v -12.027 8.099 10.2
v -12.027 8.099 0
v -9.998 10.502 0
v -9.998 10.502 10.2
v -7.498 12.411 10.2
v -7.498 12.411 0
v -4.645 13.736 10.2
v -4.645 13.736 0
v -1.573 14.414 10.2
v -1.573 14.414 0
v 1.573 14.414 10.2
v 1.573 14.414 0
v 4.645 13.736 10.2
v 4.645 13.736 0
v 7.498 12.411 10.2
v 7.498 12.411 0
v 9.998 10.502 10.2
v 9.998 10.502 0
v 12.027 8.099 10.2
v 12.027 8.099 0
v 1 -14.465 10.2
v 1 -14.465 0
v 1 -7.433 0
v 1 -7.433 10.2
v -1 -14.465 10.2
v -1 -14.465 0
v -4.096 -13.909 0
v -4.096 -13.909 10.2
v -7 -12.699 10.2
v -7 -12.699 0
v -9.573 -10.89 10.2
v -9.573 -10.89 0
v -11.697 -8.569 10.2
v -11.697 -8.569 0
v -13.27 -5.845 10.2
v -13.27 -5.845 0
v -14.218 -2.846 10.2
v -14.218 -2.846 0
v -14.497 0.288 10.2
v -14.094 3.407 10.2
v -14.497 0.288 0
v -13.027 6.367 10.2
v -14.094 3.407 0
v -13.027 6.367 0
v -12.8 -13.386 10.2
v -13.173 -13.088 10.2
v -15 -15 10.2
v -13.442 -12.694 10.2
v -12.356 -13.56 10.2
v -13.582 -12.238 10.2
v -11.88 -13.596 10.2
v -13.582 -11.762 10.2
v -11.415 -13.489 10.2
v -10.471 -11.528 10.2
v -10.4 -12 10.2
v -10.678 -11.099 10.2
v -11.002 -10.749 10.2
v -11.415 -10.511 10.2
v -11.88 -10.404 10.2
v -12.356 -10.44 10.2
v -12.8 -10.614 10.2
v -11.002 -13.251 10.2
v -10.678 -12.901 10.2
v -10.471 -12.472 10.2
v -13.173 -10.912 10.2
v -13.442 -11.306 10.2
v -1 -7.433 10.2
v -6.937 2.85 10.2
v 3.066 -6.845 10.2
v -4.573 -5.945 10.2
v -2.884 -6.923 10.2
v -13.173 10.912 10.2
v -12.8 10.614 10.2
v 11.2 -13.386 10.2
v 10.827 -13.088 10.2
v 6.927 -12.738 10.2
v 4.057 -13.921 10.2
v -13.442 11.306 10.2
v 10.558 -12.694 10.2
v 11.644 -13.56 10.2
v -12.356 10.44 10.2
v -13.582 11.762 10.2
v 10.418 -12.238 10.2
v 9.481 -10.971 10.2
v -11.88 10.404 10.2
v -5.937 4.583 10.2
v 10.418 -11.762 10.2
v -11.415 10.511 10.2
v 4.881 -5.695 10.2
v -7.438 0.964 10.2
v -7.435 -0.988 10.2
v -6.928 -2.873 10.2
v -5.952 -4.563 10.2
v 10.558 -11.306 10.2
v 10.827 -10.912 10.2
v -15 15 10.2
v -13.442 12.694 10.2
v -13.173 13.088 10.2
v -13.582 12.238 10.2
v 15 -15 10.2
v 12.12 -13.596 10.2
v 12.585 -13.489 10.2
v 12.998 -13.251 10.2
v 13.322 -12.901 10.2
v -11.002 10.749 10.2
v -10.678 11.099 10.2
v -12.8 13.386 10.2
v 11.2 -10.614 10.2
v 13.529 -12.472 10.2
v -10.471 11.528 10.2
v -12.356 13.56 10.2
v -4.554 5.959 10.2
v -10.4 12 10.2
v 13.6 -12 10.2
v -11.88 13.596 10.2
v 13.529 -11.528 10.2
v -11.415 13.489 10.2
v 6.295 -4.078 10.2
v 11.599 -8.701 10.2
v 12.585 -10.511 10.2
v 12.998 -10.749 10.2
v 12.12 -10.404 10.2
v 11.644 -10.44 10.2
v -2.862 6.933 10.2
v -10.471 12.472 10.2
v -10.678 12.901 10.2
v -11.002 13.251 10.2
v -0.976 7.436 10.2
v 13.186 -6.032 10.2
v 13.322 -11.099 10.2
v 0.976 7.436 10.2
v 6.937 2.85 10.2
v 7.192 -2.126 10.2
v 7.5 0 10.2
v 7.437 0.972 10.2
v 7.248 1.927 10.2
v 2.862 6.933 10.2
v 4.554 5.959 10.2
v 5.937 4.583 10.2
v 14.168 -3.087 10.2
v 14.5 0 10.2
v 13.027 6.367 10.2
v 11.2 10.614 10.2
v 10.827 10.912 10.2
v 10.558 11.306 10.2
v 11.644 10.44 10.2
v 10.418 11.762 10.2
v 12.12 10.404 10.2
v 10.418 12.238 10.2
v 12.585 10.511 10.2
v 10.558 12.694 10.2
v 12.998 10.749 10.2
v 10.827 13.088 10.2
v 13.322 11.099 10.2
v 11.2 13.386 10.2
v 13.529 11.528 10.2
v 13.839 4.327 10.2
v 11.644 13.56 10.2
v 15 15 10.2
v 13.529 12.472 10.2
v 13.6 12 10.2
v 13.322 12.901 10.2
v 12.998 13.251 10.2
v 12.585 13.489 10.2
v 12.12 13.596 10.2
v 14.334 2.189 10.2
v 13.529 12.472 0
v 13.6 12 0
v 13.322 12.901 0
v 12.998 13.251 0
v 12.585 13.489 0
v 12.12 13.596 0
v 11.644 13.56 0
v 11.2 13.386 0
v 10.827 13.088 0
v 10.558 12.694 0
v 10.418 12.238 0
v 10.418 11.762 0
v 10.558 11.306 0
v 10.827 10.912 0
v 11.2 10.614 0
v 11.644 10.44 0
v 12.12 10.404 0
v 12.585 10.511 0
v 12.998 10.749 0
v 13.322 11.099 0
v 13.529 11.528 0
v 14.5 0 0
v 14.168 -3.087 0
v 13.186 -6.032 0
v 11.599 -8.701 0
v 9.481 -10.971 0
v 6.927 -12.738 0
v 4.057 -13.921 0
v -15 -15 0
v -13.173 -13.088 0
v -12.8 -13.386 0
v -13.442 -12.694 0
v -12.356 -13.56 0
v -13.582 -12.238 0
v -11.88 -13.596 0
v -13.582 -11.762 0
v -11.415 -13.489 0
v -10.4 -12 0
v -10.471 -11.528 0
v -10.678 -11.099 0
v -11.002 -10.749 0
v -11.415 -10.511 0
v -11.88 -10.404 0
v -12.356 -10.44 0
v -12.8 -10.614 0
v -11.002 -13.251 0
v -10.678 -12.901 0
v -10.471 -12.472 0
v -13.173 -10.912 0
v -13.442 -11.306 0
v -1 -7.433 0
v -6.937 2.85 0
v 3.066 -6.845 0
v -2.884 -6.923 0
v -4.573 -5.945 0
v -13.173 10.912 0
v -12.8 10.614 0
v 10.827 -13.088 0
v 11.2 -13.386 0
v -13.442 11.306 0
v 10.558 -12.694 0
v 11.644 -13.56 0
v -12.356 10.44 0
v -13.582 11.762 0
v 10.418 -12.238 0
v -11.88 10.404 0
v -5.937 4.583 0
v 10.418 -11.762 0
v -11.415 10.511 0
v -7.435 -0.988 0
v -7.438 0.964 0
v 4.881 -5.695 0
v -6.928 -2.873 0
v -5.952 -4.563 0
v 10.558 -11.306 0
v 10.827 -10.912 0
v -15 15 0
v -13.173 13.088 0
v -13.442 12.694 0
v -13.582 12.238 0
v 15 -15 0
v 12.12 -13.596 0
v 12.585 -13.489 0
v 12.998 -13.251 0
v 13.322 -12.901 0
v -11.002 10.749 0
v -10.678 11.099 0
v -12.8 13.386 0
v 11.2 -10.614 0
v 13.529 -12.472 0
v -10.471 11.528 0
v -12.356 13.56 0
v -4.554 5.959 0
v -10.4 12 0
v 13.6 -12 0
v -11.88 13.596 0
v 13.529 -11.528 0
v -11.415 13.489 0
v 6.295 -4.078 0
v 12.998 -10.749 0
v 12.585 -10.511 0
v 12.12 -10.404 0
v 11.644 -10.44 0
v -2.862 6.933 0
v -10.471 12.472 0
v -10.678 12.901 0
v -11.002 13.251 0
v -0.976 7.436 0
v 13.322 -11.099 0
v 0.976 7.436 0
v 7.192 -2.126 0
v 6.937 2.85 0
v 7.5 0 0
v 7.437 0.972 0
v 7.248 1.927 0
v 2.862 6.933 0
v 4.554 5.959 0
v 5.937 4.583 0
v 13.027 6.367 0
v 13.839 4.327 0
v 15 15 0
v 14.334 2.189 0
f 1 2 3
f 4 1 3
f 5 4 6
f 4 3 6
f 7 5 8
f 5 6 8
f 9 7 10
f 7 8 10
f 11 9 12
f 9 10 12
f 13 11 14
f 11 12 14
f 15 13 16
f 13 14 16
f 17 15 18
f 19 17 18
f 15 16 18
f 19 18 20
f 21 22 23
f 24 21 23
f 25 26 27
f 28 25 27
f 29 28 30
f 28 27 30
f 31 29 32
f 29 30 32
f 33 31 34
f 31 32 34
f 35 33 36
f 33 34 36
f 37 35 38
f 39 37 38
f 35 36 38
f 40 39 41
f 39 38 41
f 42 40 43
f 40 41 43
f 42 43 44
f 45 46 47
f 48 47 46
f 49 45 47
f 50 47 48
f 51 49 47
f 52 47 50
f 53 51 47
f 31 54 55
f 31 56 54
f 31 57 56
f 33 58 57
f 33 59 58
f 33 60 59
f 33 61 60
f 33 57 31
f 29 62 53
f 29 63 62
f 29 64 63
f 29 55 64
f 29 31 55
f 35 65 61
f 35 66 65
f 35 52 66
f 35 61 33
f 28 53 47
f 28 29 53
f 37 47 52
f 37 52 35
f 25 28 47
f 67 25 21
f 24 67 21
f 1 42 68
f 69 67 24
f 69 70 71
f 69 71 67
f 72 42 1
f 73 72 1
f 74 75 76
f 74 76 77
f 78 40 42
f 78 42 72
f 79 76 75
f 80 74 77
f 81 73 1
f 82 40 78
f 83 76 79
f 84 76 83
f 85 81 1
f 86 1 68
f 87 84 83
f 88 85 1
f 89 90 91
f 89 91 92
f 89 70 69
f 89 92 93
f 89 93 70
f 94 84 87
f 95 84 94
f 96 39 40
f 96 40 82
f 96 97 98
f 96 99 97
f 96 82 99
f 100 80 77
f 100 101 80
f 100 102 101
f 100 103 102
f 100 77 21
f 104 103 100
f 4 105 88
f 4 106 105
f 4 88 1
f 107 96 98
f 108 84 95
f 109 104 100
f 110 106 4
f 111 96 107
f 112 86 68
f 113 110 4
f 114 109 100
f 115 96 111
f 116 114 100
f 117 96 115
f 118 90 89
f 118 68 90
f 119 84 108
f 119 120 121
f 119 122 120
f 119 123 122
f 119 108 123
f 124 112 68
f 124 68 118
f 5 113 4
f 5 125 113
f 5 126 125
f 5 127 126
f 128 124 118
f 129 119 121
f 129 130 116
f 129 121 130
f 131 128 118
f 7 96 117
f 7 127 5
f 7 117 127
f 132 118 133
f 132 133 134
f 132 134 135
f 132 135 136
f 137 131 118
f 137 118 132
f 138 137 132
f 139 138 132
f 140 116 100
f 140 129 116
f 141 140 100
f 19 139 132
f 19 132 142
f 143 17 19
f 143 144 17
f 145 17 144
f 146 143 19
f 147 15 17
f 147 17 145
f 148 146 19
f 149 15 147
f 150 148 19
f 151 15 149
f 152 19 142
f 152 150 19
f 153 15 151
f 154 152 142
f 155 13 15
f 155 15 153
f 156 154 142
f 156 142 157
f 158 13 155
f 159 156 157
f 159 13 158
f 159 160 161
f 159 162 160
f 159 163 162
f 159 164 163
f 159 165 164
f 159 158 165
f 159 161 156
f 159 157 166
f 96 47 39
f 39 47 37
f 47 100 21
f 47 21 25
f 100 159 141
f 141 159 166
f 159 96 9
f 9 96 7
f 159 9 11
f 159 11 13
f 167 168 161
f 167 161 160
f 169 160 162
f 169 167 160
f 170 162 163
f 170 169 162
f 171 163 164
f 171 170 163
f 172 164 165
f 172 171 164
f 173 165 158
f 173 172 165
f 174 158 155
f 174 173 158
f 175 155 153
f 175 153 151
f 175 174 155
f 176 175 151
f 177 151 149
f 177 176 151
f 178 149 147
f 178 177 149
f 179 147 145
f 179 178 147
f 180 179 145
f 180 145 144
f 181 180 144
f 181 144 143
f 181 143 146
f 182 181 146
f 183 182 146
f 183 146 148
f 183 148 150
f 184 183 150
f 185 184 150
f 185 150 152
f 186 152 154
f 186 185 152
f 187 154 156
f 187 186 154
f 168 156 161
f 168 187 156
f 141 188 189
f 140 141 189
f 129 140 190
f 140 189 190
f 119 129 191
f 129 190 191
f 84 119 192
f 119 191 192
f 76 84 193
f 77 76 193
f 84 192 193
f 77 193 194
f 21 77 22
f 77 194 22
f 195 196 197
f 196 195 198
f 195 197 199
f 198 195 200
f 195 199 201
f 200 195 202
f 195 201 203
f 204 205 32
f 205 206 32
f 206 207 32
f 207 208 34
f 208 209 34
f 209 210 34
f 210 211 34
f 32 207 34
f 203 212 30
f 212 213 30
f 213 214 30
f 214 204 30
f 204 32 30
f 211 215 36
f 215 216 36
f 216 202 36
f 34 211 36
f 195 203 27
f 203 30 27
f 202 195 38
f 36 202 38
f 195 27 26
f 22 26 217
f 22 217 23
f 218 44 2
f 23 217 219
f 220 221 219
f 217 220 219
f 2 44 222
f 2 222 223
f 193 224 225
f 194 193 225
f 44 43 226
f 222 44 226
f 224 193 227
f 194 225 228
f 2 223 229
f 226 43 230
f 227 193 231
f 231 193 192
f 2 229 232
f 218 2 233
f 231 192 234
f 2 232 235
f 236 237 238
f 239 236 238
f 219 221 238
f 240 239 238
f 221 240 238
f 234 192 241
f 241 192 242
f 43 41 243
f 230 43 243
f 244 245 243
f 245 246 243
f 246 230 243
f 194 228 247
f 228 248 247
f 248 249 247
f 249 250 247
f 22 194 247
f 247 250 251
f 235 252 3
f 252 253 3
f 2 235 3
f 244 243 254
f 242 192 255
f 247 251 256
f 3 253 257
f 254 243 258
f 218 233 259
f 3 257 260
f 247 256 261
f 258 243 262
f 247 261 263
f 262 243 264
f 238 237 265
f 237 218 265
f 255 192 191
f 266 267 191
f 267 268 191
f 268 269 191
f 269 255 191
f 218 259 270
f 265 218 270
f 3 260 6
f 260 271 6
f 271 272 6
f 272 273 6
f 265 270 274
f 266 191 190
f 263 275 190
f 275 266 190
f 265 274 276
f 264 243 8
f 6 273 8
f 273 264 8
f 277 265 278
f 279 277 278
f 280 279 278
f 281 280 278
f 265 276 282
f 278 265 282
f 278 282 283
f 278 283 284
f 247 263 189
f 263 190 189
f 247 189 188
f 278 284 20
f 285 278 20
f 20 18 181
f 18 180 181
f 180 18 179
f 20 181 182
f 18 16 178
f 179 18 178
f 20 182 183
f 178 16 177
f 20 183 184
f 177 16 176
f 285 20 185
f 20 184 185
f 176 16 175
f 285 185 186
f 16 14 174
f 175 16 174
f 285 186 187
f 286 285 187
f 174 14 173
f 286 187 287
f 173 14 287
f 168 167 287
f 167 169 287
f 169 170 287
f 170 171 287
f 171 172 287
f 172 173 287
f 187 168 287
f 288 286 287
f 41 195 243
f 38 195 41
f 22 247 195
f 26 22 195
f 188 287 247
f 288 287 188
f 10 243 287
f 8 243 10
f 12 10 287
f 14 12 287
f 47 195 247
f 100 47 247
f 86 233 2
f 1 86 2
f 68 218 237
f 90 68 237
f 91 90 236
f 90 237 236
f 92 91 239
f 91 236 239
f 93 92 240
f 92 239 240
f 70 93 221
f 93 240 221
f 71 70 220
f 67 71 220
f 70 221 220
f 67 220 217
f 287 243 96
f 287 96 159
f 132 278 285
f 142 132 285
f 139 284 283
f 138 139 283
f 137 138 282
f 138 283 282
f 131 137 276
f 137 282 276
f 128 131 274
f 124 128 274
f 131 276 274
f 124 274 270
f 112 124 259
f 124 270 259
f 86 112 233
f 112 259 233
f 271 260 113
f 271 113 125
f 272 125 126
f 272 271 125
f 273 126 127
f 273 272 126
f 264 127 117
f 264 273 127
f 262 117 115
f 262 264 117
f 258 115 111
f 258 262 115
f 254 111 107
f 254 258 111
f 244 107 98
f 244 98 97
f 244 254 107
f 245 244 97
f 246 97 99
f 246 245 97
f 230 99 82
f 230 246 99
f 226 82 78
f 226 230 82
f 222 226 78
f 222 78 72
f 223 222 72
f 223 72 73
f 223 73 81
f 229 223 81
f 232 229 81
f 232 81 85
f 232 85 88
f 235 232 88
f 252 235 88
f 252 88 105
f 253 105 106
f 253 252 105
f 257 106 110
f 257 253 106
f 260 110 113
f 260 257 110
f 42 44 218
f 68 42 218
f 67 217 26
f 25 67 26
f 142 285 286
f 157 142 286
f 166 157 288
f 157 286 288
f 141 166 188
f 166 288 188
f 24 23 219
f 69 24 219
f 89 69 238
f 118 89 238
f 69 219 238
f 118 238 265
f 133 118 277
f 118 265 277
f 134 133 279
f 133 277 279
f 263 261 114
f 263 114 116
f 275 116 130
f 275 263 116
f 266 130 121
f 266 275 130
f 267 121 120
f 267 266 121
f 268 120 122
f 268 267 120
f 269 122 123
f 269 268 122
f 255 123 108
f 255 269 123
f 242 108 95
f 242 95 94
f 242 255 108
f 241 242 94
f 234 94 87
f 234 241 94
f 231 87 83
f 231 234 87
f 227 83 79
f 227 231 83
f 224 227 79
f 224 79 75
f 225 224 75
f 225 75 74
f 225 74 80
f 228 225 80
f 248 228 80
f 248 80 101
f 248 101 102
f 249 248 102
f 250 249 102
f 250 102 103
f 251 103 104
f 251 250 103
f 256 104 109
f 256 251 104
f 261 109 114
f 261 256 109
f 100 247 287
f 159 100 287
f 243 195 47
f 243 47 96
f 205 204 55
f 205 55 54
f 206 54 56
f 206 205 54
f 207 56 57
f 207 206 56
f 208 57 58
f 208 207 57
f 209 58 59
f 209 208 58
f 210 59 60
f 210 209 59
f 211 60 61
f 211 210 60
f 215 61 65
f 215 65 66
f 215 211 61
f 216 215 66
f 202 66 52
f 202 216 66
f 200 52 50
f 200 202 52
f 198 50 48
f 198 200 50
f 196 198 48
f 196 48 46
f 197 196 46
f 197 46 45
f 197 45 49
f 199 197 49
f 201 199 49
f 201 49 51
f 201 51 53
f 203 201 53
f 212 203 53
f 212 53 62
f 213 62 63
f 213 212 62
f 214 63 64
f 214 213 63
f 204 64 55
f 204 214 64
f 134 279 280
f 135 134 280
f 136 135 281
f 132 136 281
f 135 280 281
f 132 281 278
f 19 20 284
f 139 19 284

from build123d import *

# Parameters (mm, degrees)
F0_W     = 30
F0_H     = 30
F0_R     = 1.6
F1_DEPTH = 10.2


with BuildPart() as f1:
    # F0 (on Top) → F1 (new body)
    with BuildSketch(Plane.XY):
        Rectangle(F0_W, F0_H)
        with Locations((-12, -12)):
            Circle(F0_R, mode=Mode.SUBTRACT)
        with Locations((12, -12)):
            Circle(F0_R, mode=Mode.SUBTRACT)
        with Locations((-12, 12)):
            Circle(F0_R, mode=Mode.SUBTRACT)
        with BuildLine():
            ThreePointArc((13.0274698164, 6.366712667), (14.1270717478, 3.2673909823), (14.5, 0))
            ThreePointArc((14.5, 0), (10.6007075236, -9.8931794687), (1, -14.4654761415))
            Line((1, -14.4654761415), (1, -14.5))
            Line((1, -14.5), (0, -14.5))
            Line((0, -14.5), (-1, -14.5))
            Line((-1, -14.5), (-1, -14.4654761415))
            ThreePointArc((-1, -14.4654761415), (-12.5573683549, -7.25), (-13.0274698164, 6.366712667))
            Line((-13.0274698164, 6.366712667), (-13.0573683549, 6.3839745962))
            Line((-13.0573683549, 6.3839745962), (-12.5573697637, 7.2499975598))
            Line((-12.5573697637, 7.2499975598), (-12.0573683549, 8.1160254038))
            Line((-12.0573683549, 8.1160254038), (-12.0274698164, 8.0987634745))
            ThreePointArc((-12.0274698164, 8.0987634745), (0, 14.5), (12.0274698164, 8.0987634745))
            Line((12.0274698164, 8.0987634745), (12.0573683549, 8.1160254038))
            Line((12.0573683549, 8.1160254038), (12.5573697634, 7.2499975604))
            Line((12.5573697634, 7.2499975604), (13.0573683549, 6.3839745962))
            Line((13.0573683549, 6.3839745962), (13.0274698164, 6.366712667))
        make_face(mode=Mode.SUBTRACT)
        with Locations((12, 12)):
            Circle(F0_R, mode=Mode.SUBTRACT)
        with BuildLine():
            Line((6.9371965948, 2.850491783), (13.0274698164, 6.366712667))
            ThreePointArc((13.0274698164, 6.366712667), (12.8000410988, 6.8124113109), (12.5573697634, 7.2499975604))
            ThreePointArc((12.5573697634, 7.2499975604), (12.2997432975, 7.678952716), (12.0274698164, 8.0987634745))
            Line((12.0274698164, 8.0987634745), (5.9371965948, 4.5825425906))
            ThreePointArc((5.9371965948, 4.5825425906), (6.4951905284, 3.75), (6.9371965948, 2.850491783))
        make_face()
        with BuildLine():
            Line((-5.9371965948, 4.5825425906), (-12.0274698164, 8.0987634745))
            ThreePointArc((-12.0274698164, 8.0987634745), (-12.2997432977, 7.6789527158), (-12.5573697637, 7.2499975598))
            ThreePointArc((-12.5573697637, 7.2499975598), (-12.800041099, 6.8124113106), (-13.0274698164, 6.366712667))
            Line((-13.0274698164, 6.366712667), (-6.9371965948, 2.850491783))
            ThreePointArc((-6.9371965948, 2.850491783), (-6.4951905284, 3.75), (-5.9371965948, 4.5825425906))
        make_face()
        with BuildLine():
            ThreePointArc((0, -14.5), (0.5002978855, -14.4913664651), (1, -14.4654761415))
            Line((1, -14.4654761415), (1, -7.4330343737))
            ThreePointArc((1, -7.4330343737), (0, -7.5), (-1, -7.4330343737))
            Line((-1, -7.4330343737), (-1, -14.4654761415))
            ThreePointArc((-1, -14.4654761415), (-0.5002978855, -14.4913664651), (0, -14.5))
        make_face()
        with BuildLine():
            ThreePointArc((7.5, 0), (7.3579540112, 1.4527603965), (6.9371965948, 2.850491783))
            Line((6.9371965948, 2.850491783), (5.9371965948, 4.5825425906))
            ThreePointArc((5.9371965948, 4.5825425906), (0, 7.5), (-5.9371965948, 4.5825425906))
            Line((-5.9371965948, 4.5825425906), (-6.9371965948, 2.850491783))
            ThreePointArc((-6.9371965948, 2.850491783), (-6.4951905284, -3.75), (-1, -7.4330343737))
            Line((-1, -7.4330343737), (1, -7.4330343737))
            ThreePointArc((1, -7.4330343737), (5.6457948953, -4.9371044145), (7.5, 0))
        make_face()
        with BuildLine():
            ThreePointArc((12.5573697634, 7.2499975604), (12.8000410988, 6.8124113109), (13.0274698164, 6.366712667))
            Line((13.0274698164, 6.366712667), (13.0573683549, 6.3839745962))
            Line((13.0573683549, 6.3839745962), (12.5573697634, 7.2499975604))
        make_face()
        with BuildLine():
            ThreePointArc((-1, -7.4330343737), (0, -7.5), (1, -7.4330343737))
            Line((1, -7.4330343737), (-1, -7.4330343737))
        make_face()
        with BuildLine():
            Line((-6.9371965948, 2.850491783), (-5.9371965948, 4.5825425906))
            ThreePointArc((-5.9371965948, 4.5825425906), (-6.4951905284, 3.75), (-6.9371965948, 2.850491783))
        make_face()
        with BuildLine():
            Line((5.9371965948, 4.5825425906), (6.9371965948, 2.850491783))
            ThreePointArc((6.9371965948, 2.850491783), (6.4951905284, 3.75), (5.9371965948, 4.5825425906))
        make_face()
        with BuildLine():
            Line((1, -14.5), (1, -14.4654761415))
            ThreePointArc((1, -14.4654761415), (0.5002978855, -14.4913664651), (0, -14.5))
            Line((0, -14.5), (1, -14.5))
        make_face()
        with BuildLine():
            Line((-1, -14.5), (0, -14.5))
            ThreePointArc((0, -14.5), (-0.5002978855, -14.4913664651), (-1, -14.4654761415))
            Line((-1, -14.4654761415), (-1, -14.5))
        make_face()
        with BuildLine():
            Line((-13.0573683549, 6.3839745962), (-13.0274698164, 6.366712667))
            ThreePointArc((-13.0274698164, 6.366712667), (-12.800041099, 6.8124113106), (-12.5573697637, 7.2499975598))
            Line((-12.5573697637, 7.2499975598), (-13.0573683549, 6.3839745962))
        make_face()
        with BuildLine():
            ThreePointArc((-12.5573697637, 7.2499975598), (-12.2997432977, 7.6789527158), (-12.0274698164, 8.0987634745))
            Line((-12.0274698164, 8.0987634745), (-12.0573683549, 8.1160254038))
            Line((-12.0573683549, 8.1160254038), (-12.5573697637, 7.2499975598))
        make_face()
        with BuildLine():
            ThreePointArc((12.0274698164, 8.0987634745), (12.2997432975, 7.678952716), (12.5573697634, 7.2499975604))
            Line((12.5573697634, 7.2499975604), (12.0573683549, 8.1160254038))
            Line((12.0573683549, 8.1160254038), (12.0274698164, 8.0987634745))
        make_face()
    extrude(amount=F1_DEPTH)


solid = f1.part
